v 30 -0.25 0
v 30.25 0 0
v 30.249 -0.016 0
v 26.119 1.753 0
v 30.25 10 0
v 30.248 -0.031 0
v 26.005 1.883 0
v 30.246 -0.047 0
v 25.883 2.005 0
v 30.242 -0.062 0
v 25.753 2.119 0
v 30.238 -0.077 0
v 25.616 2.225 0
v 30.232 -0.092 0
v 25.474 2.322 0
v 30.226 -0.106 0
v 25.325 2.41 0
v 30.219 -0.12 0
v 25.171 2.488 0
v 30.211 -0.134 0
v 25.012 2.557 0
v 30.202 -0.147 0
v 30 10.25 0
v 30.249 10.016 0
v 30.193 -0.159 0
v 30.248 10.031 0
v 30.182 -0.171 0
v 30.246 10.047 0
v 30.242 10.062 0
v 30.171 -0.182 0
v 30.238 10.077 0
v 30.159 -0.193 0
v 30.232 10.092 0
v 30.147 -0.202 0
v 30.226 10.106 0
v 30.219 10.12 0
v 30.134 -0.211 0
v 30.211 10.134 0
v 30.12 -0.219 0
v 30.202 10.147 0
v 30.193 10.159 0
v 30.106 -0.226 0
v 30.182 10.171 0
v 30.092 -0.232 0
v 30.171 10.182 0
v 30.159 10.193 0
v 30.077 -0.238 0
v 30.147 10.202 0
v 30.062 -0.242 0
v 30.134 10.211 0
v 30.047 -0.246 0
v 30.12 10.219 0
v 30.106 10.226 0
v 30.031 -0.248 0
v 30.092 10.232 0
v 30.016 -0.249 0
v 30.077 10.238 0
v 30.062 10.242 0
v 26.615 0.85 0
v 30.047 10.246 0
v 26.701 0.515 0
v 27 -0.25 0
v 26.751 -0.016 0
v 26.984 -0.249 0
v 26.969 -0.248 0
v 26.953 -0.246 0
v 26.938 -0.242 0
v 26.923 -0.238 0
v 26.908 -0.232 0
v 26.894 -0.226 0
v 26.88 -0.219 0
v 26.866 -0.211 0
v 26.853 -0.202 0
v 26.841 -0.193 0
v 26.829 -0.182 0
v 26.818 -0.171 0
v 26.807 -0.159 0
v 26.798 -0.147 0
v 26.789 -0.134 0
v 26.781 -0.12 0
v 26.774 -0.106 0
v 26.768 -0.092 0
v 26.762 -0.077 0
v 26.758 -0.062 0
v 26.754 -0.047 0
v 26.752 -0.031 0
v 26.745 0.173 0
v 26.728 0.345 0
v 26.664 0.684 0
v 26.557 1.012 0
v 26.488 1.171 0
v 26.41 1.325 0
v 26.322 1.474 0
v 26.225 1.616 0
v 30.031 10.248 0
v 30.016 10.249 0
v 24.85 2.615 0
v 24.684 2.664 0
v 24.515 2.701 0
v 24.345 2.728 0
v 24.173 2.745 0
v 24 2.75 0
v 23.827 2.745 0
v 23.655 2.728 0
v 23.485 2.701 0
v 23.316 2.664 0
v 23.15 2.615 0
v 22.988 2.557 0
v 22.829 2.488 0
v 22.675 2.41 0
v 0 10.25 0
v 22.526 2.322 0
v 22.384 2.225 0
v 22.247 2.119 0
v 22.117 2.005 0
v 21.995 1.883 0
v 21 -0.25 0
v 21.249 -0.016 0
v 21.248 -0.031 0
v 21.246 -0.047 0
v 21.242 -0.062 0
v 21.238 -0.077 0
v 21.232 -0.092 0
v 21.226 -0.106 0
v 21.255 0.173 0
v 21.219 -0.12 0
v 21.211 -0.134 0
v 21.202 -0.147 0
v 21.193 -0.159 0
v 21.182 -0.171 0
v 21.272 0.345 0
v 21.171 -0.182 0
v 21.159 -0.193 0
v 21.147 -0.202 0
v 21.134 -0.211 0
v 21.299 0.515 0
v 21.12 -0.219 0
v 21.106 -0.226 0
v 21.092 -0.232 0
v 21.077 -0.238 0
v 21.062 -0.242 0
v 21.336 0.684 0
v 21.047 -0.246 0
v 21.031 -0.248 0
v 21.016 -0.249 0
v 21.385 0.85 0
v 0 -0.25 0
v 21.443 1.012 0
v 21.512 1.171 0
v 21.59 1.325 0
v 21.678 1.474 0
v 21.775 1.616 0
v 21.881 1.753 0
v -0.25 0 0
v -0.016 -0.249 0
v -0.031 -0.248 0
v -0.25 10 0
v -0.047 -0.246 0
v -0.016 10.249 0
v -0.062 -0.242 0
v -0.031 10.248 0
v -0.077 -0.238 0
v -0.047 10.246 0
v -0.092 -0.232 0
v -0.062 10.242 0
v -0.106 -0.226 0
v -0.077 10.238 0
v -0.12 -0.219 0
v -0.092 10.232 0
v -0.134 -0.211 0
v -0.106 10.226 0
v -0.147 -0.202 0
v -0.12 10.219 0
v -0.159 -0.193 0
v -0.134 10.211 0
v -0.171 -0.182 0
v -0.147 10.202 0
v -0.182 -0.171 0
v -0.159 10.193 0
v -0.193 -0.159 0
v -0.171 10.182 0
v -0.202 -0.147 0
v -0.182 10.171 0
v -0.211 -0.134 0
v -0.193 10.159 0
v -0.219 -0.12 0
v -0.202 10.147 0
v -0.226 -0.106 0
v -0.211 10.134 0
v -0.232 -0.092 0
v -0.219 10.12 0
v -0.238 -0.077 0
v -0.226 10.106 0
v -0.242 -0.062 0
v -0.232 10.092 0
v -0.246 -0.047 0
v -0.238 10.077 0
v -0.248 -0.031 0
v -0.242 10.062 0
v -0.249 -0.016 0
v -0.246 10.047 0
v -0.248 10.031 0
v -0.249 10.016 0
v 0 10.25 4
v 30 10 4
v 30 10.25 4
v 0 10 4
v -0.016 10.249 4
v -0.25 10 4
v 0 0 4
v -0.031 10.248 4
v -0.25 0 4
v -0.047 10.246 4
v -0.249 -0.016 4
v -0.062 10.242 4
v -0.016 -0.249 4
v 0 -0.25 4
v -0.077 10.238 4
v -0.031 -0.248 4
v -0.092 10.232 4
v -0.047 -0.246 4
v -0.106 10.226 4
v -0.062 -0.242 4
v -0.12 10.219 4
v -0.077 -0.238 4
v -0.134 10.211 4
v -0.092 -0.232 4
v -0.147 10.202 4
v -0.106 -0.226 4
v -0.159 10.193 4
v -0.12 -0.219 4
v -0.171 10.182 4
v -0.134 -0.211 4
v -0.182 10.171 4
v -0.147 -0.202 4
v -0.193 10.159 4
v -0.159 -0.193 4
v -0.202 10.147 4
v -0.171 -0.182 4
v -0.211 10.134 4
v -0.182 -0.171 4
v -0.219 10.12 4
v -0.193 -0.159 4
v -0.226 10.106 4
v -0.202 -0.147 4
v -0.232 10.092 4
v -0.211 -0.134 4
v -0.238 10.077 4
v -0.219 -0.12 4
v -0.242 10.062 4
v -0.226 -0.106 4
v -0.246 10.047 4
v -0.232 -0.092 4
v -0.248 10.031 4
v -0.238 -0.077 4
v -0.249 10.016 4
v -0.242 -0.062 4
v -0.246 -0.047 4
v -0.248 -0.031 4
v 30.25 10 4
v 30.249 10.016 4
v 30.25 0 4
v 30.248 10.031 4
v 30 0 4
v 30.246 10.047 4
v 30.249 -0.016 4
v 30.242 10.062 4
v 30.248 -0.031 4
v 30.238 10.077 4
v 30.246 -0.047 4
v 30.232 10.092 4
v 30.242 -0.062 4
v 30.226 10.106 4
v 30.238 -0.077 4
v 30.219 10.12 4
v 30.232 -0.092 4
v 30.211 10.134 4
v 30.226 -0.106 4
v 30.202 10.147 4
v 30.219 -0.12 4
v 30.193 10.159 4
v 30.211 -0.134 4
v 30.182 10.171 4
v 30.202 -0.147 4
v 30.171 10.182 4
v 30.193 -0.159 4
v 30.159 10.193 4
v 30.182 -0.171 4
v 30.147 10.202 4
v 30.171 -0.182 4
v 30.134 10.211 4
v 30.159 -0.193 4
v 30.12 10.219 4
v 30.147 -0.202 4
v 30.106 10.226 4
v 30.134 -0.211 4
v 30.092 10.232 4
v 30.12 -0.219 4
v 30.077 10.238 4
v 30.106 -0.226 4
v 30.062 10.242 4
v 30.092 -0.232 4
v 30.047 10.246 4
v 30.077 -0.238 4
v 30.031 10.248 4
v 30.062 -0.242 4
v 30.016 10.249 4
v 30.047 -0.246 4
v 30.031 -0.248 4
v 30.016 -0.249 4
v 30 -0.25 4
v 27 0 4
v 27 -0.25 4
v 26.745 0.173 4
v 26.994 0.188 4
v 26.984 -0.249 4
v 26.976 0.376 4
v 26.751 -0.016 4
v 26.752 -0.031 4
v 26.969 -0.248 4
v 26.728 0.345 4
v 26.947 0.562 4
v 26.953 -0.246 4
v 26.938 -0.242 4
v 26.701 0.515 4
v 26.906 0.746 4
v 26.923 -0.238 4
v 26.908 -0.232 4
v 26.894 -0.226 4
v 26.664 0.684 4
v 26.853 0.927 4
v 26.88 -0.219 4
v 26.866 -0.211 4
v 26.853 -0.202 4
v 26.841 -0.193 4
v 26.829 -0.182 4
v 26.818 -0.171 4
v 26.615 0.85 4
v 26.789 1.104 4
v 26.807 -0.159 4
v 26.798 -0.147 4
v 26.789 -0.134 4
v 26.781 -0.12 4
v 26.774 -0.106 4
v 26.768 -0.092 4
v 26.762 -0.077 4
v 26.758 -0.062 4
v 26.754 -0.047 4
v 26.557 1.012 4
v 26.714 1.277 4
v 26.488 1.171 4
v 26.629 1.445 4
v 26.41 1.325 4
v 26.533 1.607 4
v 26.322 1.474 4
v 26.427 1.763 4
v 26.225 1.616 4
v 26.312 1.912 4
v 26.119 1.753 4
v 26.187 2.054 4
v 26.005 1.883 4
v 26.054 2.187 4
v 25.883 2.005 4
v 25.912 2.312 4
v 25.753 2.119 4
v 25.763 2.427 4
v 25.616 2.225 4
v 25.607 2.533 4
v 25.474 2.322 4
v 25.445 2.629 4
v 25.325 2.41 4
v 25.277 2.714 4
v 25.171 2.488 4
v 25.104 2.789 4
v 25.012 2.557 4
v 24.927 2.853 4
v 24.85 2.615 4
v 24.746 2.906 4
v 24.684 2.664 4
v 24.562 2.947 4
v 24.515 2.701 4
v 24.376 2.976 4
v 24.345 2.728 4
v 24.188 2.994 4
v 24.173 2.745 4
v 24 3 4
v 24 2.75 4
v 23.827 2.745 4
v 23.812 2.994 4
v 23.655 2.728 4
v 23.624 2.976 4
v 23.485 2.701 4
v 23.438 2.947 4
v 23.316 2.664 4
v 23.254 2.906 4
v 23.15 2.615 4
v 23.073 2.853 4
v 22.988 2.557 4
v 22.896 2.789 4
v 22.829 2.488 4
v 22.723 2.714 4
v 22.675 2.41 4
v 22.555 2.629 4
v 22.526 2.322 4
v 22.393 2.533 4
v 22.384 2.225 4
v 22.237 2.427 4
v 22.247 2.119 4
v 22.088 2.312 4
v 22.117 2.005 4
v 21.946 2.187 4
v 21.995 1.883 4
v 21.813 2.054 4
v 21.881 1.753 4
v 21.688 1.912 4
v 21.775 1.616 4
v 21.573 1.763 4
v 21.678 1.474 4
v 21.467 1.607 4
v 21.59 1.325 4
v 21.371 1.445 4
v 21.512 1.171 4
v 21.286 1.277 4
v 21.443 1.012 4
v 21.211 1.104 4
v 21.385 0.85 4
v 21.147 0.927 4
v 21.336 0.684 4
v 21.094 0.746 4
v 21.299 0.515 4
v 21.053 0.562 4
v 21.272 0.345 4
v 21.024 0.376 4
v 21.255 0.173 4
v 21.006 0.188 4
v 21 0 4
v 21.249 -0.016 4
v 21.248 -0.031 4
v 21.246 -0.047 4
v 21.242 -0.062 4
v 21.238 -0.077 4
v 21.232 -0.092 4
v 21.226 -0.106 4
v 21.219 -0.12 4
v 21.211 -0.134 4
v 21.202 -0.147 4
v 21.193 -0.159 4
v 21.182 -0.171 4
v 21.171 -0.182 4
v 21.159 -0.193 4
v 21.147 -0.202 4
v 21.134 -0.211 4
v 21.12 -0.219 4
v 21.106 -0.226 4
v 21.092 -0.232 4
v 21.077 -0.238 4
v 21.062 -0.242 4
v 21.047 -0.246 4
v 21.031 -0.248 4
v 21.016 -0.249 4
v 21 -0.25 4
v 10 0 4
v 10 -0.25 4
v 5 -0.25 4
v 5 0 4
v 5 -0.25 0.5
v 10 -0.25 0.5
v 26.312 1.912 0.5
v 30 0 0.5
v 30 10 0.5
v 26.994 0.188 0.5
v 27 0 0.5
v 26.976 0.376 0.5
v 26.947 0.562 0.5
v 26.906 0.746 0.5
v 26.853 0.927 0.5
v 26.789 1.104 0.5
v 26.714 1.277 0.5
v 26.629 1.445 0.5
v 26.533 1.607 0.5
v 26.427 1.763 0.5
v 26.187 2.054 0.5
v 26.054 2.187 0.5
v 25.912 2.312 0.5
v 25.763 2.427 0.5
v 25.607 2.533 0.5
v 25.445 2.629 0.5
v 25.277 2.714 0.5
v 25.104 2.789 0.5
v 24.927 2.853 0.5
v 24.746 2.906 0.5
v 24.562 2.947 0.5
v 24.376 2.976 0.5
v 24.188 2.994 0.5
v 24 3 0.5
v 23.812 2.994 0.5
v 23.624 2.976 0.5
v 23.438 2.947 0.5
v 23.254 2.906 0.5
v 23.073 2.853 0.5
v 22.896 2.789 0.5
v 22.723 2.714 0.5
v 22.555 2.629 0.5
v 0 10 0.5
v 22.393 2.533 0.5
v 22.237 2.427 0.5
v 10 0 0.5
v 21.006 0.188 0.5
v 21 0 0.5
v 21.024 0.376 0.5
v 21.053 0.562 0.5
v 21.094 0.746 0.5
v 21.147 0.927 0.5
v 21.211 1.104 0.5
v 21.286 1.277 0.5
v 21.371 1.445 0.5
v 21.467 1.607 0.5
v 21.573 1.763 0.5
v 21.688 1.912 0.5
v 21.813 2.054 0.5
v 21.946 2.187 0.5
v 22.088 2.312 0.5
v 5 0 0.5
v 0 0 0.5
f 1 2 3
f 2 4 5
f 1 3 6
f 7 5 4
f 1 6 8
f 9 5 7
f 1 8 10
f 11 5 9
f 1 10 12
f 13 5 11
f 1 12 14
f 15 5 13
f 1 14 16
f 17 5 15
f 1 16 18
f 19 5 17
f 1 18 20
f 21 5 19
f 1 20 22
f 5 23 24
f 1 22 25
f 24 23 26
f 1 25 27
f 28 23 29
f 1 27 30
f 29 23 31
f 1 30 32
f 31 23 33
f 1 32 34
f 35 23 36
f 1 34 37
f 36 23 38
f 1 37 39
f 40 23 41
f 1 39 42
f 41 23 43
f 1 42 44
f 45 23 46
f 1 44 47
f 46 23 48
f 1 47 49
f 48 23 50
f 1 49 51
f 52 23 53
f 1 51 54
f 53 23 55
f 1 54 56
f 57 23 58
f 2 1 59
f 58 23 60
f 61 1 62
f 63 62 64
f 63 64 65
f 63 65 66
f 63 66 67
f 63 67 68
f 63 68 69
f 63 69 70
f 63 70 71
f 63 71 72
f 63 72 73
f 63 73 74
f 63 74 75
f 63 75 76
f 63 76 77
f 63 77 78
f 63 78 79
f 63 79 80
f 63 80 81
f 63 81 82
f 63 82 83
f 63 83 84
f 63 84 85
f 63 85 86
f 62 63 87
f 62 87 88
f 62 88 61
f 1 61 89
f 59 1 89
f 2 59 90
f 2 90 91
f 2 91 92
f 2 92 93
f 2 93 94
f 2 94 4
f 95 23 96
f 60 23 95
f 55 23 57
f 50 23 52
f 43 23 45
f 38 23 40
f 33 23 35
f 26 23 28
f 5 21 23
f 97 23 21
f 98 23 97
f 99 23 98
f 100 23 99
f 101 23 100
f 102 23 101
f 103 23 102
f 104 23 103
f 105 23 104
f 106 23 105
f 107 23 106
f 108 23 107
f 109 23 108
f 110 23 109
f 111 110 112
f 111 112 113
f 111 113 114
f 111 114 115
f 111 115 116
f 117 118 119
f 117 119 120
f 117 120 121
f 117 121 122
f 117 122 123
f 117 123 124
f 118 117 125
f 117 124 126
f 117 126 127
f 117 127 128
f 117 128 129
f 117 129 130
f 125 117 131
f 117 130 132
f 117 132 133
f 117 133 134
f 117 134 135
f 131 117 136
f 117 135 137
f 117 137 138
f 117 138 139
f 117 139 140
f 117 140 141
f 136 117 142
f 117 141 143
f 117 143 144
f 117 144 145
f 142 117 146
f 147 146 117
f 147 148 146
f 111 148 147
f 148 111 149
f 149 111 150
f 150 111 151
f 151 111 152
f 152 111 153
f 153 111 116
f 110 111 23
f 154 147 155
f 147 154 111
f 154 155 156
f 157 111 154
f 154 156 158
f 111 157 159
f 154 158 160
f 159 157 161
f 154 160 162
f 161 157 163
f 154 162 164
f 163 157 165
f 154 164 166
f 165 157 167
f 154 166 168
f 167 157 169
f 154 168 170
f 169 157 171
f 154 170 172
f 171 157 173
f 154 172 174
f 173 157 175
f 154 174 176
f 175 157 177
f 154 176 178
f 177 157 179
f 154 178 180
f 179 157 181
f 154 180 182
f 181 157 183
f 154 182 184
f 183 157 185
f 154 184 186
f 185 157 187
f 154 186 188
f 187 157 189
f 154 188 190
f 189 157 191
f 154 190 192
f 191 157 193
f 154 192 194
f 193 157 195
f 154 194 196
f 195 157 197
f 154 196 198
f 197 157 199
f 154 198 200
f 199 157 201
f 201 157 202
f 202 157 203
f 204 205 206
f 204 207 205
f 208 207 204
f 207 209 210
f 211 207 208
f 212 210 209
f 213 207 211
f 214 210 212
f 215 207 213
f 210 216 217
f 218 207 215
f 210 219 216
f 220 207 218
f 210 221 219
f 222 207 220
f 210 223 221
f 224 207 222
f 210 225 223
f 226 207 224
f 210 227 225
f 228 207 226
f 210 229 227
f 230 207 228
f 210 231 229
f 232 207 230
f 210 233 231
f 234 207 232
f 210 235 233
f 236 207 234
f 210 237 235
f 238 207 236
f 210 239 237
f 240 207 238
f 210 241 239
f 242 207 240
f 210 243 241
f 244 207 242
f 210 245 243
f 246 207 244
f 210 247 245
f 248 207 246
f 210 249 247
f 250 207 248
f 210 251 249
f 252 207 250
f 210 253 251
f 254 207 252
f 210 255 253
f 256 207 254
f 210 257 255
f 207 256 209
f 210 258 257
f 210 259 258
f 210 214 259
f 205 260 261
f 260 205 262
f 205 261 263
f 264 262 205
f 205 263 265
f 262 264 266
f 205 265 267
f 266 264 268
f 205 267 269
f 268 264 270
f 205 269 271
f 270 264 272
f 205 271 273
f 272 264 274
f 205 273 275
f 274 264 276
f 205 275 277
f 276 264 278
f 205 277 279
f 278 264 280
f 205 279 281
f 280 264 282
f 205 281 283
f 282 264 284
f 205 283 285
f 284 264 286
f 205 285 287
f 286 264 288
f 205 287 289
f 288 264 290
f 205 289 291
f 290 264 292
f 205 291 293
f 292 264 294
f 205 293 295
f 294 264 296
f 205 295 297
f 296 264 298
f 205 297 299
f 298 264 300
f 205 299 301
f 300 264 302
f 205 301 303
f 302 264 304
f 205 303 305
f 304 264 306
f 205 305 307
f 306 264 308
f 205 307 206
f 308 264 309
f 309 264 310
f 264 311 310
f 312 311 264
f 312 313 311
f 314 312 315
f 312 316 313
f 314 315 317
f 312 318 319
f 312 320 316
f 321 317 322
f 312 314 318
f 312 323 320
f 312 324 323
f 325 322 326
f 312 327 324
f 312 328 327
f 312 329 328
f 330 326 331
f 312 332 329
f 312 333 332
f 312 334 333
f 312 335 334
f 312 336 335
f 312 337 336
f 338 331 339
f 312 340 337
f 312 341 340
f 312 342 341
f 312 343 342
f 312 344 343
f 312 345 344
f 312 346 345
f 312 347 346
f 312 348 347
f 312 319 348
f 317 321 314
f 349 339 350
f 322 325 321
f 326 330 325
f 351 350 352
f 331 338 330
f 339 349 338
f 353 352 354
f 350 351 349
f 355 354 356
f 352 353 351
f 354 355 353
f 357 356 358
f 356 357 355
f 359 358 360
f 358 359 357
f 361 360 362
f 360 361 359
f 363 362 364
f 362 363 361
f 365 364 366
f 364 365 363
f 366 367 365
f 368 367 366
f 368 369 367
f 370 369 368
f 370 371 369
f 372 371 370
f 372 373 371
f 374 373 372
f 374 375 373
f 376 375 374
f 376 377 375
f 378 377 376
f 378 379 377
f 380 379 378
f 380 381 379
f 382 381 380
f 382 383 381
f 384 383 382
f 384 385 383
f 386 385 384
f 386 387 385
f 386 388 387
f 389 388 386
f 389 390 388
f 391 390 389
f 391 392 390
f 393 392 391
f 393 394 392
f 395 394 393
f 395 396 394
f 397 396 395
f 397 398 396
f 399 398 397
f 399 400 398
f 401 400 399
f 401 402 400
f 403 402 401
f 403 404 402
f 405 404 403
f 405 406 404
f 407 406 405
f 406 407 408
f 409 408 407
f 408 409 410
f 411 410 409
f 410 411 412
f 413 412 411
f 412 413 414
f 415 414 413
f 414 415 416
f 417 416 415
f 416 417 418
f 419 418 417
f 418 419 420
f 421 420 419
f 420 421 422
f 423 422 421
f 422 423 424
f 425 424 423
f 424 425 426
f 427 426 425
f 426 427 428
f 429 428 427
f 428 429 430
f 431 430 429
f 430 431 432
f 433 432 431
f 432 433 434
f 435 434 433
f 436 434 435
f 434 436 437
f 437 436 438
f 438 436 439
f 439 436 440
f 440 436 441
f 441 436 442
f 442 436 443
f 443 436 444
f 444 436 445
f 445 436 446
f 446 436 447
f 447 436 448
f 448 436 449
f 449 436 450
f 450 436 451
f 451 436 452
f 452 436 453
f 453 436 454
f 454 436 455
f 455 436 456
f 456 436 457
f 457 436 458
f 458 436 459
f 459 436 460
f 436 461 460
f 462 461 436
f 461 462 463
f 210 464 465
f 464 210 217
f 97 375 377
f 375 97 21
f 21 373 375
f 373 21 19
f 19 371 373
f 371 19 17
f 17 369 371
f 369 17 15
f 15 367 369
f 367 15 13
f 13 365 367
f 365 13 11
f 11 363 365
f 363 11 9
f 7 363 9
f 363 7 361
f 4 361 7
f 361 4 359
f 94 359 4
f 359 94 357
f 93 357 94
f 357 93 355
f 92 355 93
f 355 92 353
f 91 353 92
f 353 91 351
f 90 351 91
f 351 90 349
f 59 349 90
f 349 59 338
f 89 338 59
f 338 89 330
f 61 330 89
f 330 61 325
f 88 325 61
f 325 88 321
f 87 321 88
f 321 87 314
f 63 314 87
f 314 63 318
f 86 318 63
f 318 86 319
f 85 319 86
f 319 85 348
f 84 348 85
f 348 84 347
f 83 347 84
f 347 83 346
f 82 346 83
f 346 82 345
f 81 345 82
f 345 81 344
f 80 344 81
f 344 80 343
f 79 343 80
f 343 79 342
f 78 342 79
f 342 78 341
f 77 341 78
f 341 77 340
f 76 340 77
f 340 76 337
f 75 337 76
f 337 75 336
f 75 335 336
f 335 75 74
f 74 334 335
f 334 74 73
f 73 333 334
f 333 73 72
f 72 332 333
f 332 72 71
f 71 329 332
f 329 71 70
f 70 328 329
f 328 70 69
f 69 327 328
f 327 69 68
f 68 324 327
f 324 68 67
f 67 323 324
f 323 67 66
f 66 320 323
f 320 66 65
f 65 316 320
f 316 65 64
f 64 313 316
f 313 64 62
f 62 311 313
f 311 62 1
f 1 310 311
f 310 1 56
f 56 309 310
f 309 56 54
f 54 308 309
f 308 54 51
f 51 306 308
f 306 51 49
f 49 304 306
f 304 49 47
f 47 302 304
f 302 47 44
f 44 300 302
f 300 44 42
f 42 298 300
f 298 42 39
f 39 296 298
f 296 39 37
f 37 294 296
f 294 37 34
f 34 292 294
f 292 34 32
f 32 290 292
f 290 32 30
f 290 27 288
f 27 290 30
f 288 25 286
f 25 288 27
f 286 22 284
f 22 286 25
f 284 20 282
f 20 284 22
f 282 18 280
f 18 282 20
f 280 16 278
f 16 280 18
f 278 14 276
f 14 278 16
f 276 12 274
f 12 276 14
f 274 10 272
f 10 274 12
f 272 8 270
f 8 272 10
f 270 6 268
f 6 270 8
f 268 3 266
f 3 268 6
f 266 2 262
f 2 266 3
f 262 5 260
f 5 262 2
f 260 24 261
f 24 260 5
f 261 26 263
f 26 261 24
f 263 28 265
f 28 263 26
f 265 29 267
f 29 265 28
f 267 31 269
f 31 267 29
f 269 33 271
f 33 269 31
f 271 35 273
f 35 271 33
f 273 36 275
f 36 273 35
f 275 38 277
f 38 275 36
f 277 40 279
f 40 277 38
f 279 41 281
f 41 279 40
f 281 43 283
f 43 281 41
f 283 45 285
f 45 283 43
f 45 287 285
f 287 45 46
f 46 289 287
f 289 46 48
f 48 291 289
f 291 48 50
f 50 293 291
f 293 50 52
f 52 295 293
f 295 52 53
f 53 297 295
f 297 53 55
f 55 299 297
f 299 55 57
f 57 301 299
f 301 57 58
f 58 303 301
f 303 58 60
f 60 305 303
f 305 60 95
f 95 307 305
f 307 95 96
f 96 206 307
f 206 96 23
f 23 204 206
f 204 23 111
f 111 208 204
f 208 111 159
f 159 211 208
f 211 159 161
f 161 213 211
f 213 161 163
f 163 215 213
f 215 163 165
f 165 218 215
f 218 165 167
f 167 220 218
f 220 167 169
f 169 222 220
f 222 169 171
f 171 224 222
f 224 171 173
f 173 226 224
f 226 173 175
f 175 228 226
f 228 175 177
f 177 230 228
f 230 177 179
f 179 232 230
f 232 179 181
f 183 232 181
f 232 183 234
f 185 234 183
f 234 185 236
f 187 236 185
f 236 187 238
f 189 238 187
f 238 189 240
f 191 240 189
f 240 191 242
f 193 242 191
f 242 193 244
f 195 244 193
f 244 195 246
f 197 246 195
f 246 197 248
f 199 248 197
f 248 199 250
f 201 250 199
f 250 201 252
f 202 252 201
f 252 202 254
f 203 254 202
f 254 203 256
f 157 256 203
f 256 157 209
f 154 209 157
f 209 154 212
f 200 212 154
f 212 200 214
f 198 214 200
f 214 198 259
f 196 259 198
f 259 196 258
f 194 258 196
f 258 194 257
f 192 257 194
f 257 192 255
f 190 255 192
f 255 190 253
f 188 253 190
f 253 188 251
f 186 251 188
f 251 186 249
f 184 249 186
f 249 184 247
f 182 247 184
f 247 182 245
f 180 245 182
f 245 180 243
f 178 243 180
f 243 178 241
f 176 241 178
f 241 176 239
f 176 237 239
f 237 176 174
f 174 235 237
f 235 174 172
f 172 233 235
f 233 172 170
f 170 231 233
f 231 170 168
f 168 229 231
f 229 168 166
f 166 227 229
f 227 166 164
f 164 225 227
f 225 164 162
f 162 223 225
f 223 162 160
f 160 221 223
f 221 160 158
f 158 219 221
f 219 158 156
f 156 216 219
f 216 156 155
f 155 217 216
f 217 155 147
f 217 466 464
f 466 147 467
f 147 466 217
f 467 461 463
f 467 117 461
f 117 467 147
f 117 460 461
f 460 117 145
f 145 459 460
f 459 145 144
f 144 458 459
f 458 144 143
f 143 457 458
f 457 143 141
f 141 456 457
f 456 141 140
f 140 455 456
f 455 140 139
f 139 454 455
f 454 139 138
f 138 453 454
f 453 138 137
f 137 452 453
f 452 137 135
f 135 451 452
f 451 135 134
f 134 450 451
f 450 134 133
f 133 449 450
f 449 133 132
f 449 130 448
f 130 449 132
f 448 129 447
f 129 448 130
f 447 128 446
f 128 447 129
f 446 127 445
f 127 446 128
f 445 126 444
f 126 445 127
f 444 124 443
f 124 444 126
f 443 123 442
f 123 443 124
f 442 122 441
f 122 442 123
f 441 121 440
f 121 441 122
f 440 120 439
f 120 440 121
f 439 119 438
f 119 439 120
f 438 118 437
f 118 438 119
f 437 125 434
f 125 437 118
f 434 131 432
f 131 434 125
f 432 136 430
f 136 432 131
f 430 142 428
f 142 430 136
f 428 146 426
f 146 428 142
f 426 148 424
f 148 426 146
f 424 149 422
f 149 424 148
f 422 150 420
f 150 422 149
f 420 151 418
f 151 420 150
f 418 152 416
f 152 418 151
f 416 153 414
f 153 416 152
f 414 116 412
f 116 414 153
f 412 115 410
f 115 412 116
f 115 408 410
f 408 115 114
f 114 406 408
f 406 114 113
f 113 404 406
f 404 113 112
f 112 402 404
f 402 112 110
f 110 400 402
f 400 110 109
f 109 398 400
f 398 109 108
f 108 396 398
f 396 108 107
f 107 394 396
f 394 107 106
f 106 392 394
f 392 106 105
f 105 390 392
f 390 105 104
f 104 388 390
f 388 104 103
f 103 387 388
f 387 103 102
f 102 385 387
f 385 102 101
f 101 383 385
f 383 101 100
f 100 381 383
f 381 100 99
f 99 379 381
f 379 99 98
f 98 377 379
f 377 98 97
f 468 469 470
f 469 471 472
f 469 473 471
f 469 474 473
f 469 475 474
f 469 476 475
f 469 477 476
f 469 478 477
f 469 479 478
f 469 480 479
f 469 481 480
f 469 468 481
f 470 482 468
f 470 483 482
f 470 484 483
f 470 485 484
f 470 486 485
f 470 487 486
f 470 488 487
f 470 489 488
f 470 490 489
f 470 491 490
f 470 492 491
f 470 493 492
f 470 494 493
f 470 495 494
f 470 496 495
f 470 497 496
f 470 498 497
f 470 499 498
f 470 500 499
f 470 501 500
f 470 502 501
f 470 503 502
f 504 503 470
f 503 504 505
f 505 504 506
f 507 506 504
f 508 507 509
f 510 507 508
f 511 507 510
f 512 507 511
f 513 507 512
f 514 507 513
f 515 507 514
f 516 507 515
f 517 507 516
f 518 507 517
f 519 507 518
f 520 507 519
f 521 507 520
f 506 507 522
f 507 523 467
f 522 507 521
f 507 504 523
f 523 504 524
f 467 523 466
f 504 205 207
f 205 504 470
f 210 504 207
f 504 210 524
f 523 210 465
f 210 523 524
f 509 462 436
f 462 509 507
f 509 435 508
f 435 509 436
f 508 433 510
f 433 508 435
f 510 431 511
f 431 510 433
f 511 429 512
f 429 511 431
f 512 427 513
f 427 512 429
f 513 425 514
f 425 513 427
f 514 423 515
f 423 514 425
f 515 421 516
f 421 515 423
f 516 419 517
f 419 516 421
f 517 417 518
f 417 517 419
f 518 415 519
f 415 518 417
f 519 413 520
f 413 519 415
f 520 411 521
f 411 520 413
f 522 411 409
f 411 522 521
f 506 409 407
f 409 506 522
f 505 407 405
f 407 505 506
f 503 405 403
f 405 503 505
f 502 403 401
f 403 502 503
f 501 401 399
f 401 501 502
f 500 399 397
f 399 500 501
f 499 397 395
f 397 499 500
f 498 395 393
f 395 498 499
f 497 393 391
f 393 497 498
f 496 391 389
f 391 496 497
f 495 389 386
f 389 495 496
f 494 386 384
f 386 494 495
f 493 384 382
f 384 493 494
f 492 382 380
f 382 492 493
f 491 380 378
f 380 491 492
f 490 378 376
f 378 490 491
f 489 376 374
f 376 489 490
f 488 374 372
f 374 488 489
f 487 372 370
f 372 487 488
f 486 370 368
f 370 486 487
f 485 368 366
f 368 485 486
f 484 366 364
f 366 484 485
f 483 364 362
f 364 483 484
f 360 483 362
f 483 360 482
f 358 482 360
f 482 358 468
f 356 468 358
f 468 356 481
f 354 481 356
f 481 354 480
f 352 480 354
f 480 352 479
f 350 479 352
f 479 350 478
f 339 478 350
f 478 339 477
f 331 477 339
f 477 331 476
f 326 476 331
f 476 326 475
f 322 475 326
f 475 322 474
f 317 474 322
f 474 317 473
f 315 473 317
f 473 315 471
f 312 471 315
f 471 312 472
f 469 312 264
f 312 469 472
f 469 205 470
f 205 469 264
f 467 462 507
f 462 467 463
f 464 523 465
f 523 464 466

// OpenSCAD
width = 30;
depth = 10;
height = 4;
thickness = 0.5;
faucet_radius = 3;
faucet_offset = 24;
spout_offset = 5;
spout_width = 5;
spout_length = 10;
$fs=0.1;
$fn=100;

module inner_footprint() {
    intersection() {
        difference() {
            union() {
                square([width, depth]);
                translate([faucet_offset, 0, 0]) {
                    circle(r=faucet_radius + thickness);
                }
            };
            translate([faucet_offset, 0, 0]) {
                circle(r=faucet_radius);
            };
        };
        square([width, depth]);
    };
}

module outer_footprint() {
    minkowski() {
        inner_footprint();
        circle(r=thickness / 2);
    }
}

module basin() {
    difference() {
        linear_extrude(height=height) {
            outer_footprint();
        };
        translate([0, 0, thickness]) {
            linear_extrude(height=height) {
                inner_footprint();
            };
        };
    }
}

module spout_gap() {
    translate([spout_offset, -1 * thickness, thickness]) {
        cube([spout_width, thickness * 2, height]);
    }
}

module full_model() {
    difference() {
        basin();
        spout_gap();
    }
}

full_model();
